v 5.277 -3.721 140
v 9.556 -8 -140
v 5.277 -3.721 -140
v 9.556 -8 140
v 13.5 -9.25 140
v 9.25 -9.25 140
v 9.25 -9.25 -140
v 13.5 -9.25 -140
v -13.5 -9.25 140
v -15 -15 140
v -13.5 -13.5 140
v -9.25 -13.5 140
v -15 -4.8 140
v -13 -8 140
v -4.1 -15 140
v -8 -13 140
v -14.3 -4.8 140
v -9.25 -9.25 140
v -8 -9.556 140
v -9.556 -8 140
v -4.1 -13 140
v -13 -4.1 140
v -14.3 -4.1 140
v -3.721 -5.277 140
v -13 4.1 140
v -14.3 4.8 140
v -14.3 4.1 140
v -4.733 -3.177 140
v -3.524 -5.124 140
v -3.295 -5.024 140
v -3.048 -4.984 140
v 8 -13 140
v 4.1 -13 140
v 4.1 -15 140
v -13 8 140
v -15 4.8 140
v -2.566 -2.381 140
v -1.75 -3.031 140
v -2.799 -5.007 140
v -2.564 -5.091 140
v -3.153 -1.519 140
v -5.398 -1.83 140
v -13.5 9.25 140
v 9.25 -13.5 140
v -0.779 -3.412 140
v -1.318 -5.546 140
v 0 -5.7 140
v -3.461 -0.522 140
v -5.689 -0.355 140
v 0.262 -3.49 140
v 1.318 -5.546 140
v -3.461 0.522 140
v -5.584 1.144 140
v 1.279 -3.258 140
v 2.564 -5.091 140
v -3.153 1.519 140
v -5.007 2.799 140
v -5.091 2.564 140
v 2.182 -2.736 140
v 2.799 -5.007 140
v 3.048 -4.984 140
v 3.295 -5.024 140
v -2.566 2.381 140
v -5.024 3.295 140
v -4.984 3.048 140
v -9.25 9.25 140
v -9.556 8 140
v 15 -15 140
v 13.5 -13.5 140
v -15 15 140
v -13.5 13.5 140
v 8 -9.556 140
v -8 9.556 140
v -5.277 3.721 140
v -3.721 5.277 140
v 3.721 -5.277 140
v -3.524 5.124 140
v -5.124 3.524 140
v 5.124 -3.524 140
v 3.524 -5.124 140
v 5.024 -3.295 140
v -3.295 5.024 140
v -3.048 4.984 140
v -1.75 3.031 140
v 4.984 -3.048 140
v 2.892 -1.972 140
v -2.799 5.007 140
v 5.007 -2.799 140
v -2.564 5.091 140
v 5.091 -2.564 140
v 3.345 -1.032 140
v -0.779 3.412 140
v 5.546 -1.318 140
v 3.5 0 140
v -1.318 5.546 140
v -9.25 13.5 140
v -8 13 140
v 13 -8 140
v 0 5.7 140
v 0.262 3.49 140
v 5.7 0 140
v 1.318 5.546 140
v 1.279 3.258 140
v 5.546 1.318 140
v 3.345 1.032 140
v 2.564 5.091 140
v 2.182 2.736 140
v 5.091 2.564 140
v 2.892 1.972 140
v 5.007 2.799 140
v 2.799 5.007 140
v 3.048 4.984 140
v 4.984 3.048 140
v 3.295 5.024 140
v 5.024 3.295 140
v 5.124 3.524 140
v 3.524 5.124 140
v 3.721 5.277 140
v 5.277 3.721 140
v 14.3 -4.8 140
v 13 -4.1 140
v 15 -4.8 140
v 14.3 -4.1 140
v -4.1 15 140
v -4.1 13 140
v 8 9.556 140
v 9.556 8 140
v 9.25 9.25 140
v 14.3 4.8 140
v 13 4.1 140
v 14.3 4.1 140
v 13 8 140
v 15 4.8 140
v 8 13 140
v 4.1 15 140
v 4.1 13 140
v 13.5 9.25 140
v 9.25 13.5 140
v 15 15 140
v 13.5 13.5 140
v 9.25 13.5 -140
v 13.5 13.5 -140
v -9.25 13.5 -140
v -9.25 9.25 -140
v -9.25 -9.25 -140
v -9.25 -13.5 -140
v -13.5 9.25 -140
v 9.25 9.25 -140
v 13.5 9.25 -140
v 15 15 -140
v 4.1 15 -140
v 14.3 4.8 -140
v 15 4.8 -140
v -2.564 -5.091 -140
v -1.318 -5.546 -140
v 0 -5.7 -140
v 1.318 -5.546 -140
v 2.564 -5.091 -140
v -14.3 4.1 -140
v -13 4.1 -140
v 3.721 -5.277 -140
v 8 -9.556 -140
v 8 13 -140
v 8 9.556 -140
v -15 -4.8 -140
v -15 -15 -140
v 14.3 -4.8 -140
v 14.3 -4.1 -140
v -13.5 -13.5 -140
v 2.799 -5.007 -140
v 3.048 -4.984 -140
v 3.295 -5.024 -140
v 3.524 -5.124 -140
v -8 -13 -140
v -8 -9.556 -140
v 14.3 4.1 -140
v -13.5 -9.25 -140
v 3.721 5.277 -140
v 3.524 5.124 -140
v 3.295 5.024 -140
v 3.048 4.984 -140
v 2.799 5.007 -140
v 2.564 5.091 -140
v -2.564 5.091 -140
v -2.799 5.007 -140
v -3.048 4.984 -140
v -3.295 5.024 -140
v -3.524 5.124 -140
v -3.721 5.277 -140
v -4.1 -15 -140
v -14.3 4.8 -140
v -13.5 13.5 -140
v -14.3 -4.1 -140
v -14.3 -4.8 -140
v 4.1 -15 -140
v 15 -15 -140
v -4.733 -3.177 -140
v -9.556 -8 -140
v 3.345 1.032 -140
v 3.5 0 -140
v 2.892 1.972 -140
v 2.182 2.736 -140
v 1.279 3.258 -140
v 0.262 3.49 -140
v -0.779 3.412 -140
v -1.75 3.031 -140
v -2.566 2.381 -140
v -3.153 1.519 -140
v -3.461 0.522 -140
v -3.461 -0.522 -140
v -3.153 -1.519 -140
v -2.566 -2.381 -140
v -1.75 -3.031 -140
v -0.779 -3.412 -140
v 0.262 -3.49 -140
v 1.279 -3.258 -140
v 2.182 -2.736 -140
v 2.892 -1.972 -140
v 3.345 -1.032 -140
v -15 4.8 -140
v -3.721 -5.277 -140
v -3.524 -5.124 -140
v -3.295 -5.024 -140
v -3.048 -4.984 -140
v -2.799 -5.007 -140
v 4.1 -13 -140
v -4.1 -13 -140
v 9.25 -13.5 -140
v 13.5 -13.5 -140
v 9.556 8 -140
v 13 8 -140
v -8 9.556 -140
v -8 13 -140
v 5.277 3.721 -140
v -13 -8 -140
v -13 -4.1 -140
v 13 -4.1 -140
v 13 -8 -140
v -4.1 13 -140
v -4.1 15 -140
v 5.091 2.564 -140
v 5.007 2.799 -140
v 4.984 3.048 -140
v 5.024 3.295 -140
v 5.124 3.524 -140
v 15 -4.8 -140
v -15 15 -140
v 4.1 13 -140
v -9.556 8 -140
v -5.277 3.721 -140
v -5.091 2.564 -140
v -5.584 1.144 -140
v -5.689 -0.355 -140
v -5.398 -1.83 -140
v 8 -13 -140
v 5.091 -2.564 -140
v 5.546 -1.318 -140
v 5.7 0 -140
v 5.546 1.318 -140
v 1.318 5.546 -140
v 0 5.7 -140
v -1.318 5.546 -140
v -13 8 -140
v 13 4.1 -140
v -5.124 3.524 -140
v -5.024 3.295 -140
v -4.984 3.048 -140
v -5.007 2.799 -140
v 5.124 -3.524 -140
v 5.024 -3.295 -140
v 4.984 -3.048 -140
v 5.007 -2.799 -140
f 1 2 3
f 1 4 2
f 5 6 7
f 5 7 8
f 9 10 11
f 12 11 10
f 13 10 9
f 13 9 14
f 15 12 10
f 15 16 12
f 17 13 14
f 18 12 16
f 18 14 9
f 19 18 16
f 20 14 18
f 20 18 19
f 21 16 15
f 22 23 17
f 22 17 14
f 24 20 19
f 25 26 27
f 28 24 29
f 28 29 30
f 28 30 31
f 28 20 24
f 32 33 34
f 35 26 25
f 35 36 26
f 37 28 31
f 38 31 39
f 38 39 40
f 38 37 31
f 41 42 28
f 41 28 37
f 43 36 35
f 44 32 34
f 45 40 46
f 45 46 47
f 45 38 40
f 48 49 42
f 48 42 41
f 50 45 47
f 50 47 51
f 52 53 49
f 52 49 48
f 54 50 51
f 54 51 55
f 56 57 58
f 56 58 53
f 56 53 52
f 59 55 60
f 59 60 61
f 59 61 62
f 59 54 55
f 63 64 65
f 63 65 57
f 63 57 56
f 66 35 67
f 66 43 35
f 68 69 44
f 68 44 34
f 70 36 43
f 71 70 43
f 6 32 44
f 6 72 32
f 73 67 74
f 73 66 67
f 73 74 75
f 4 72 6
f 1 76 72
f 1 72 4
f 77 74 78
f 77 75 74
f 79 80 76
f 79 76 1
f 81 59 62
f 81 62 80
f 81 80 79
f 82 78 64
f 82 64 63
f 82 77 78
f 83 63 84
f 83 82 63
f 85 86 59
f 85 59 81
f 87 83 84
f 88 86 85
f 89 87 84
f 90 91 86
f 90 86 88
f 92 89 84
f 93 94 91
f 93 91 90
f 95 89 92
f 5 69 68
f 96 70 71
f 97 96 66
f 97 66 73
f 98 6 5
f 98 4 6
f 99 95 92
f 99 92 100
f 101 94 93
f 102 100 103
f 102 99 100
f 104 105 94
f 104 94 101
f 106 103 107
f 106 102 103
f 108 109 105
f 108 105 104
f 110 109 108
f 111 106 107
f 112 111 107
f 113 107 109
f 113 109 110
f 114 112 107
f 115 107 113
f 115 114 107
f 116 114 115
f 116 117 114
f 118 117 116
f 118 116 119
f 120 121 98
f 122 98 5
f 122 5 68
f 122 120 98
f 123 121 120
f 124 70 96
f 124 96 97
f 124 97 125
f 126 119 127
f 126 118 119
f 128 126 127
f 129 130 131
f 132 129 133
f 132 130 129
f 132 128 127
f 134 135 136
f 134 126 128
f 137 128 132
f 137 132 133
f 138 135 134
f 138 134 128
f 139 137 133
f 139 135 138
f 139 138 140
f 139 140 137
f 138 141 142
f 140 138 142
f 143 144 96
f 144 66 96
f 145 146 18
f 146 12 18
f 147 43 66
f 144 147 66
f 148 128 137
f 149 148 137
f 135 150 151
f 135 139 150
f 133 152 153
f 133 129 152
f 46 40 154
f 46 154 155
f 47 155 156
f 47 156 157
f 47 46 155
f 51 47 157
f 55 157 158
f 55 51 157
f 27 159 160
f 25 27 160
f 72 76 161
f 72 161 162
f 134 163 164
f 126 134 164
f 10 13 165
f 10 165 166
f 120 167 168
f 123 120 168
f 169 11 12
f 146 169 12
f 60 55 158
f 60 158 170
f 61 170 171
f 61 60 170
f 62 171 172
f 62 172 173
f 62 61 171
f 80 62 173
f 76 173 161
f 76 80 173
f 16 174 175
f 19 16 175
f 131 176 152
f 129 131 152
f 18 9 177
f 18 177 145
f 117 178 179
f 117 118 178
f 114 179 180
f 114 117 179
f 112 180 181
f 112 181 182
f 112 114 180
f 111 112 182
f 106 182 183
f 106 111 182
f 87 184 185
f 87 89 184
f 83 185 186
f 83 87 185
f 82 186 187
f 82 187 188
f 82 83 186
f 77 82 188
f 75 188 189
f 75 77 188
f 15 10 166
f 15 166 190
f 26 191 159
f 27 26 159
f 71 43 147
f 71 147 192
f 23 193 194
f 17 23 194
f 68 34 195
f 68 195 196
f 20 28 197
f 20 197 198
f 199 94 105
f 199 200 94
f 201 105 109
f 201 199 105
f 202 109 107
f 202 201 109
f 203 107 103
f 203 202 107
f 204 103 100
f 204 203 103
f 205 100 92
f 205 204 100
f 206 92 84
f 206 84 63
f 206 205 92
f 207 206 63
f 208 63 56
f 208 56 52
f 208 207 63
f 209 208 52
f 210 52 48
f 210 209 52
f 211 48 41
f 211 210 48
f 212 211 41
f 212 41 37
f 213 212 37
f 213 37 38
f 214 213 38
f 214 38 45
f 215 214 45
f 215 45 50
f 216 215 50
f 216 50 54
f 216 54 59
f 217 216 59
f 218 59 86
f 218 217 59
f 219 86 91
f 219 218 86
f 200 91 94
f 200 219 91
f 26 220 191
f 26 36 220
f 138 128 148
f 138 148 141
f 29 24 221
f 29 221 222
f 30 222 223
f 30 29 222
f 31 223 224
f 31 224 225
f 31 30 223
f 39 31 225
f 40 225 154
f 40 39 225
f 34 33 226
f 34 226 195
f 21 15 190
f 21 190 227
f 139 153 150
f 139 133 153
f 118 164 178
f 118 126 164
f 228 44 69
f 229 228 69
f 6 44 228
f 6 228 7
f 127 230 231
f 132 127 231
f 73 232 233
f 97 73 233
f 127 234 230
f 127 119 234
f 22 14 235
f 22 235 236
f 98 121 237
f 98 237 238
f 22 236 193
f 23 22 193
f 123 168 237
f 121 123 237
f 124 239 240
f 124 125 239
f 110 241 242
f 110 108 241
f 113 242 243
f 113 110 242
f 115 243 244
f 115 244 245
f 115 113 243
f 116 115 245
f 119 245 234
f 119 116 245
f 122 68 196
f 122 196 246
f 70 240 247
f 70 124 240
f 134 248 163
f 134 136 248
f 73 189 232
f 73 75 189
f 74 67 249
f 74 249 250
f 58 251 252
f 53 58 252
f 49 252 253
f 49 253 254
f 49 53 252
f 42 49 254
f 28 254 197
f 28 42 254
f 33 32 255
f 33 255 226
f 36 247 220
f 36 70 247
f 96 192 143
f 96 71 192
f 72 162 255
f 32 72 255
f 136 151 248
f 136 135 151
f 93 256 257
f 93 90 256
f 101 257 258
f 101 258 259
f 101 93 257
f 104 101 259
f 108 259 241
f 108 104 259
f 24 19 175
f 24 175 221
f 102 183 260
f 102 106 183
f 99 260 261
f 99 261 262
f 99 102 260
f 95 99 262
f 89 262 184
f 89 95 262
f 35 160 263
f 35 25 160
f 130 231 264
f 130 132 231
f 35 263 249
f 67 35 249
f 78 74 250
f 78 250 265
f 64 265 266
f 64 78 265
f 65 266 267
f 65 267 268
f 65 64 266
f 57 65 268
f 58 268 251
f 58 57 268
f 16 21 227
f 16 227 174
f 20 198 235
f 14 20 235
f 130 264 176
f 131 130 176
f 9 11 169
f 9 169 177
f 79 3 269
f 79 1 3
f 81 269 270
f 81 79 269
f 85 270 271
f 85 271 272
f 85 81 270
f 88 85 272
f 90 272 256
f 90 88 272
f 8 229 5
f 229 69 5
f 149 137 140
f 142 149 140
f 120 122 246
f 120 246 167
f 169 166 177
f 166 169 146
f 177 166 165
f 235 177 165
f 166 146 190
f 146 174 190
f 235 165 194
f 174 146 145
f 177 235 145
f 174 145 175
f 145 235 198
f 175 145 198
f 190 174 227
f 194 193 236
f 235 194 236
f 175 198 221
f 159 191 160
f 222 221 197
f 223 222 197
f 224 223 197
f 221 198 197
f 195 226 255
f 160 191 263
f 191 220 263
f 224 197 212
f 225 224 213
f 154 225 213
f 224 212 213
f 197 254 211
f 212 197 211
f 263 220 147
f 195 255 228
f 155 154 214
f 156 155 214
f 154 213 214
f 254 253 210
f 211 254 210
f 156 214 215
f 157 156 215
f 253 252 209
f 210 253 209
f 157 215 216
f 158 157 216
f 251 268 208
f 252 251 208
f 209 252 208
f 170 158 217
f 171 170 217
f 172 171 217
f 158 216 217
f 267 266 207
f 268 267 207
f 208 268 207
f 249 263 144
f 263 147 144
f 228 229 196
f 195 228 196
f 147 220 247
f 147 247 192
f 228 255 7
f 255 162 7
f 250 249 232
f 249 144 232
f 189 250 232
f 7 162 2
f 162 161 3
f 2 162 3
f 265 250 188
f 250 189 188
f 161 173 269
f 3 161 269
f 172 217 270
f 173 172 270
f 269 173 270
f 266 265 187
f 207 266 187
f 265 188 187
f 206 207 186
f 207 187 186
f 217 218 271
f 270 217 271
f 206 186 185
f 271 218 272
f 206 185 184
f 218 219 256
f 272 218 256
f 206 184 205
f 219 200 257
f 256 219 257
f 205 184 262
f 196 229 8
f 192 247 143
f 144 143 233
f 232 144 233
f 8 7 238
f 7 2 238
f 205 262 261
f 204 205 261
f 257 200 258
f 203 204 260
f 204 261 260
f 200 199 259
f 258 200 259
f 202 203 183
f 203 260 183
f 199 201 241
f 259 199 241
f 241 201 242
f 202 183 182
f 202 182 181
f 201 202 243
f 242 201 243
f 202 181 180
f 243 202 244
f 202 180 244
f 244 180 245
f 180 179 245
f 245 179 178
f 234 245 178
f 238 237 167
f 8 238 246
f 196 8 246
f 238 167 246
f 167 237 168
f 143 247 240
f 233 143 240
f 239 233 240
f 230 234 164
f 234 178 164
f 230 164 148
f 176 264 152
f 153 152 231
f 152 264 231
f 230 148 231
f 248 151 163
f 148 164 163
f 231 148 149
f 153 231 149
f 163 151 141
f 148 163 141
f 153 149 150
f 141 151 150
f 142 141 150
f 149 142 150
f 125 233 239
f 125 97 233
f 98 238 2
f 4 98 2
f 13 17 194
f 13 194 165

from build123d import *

# Parameters (mm, degrees)
SKETCH1_R           = 3.5
SKETCH1_W           = 4.25
SKETCH1_H           = 4.25
BOSS_EXTRUDE1_DEPTH = 140


with BuildPart() as part:
    # Sketch1 → Boss-Extrude1 (new, symmetric)
    with BuildSketch(Plane.XY):
        with BuildLine():
            Line((-13, 8), (-9.555634919, 8))
            Line((-9.555634919, 8), (-5.276706211, 3.721071292))
            ThreePointArc((-5.276706211, 3.721071292), (-4.996490762, 3.172693256), (-5.090706575, 2.564119062))
            ThreePointArc((-5.090706575, 2.564119062), (-5.688941006, -0.354894676), (-4.732561446, -3.176926527))
            Line((-4.732561446, -3.176926527), (-9.555634919, -8))
            Line((-9.555634919, -8), (-13, -8))
            Line((-13, -8), (-13, -4.1))
            Line((-13, -4.1), (-14.3, -4.1))
            Line((-14.3, -4.1), (-14.3, -4.8))
            Line((-14.3, -4.8), (-15, -4.8))
            Line((-15, -4.8), (-15, -15))
            Line((-15, -15), (-4.1, -15))
            Line((-4.1, -15), (-4.1, -13))
            Line((-4.1, -13), (-8, -13))
            Line((-8, -13), (-8, -9.555634919))
            Line((-8, -9.555634919), (-3.721071292, -5.276706211))
            ThreePointArc((-3.721071292, -5.276706211), (-3.172693256, -4.996490762), (-2.564119062, -5.090706575))
            ThreePointArc((-2.564119062, -5.090706575), (0, -5.7), (2.564119062, -5.090706575))
            ThreePointArc((2.564119062, -5.090706575), (3.172693256, -4.996490762), (3.721071292, -5.276706211))
            Line((3.721071292, -5.276706211), (8, -9.555634919))
            Line((8, -9.555634919), (8, -13))
            Line((8, -13), (4.1, -13))
            Line((4.1, -13), (4.1, -15))
            Line((4.1, -15), (15, -15))
            Line((15, -15), (15, -4.8))
            Line((15, -4.8), (14.3, -4.8))
            Line((14.3, -4.8), (14.3, -4.1))
            Line((14.3, -4.1), (13, -4.1))
            Line((13, -4.1), (13, -8))
            Line((13, -8), (9.555634919, -8))
            Line((9.555634919, -8), (5.276706211, -3.721071292))
            ThreePointArc((5.276706211, -3.721071292), (4.996490762, -3.172693256), (5.090706575, -2.564119062))
            ThreePointArc((5.090706575, -2.564119062), (5.7, 0), (5.090706575, 2.564119062))
            ThreePointArc((5.090706575, 2.564119062), (4.996490762, 3.172693256), (5.276706211, 3.721071292))
            Line((5.276706211, 3.721071292), (9.555634919, 8))
            Line((9.555634919, 8), (13, 8))
            Line((13, 8), (13, 4.1))
            Line((13, 4.1), (14.3, 4.1))
            Line((14.3, 4.1), (14.3, 4.8))
            Line((14.3, 4.8), (15, 4.8))
            Line((15, 4.8), (15, 15))
            Line((15, 15), (4.1, 15))
            Line((4.1, 15), (4.1, 13))
            Line((4.1, 13), (8, 13))
            Line((8, 13), (8, 9.555634919))
            Line((8, 9.555634919), (3.721071292, 5.276706211))
            ThreePointArc((3.721071292, 5.276706211), (3.172693256, 4.996490762), (2.564119062, 5.090706575))
            ThreePointArc((2.564119062, 5.090706575), (0, 5.7), (-2.564119062, 5.090706575))
            ThreePointArc((-2.564119062, 5.090706575), (-3.172693256, 4.996490762), (-3.721071292, 5.276706211))
            Line((-3.721071292, 5.276706211), (-8, 9.555634919))
            Line((-8, 9.555634919), (-8, 13))
            Line((-8, 13), (-4.1, 13))
            Line((-4.1, 13), (-4.1, 15))
            Line((-4.1, 15), (-15, 15))
            Line((-15, 15), (-15, 4.8))
            Line((-15, 4.8), (-14.3, 4.8))
            Line((-14.3, 4.8), (-14.3, 4.1))
            Line((-14.3, 4.1), (-13, 4.1))
            Line((-13, 4.1), (-13, 8))
        make_face()
        Circle(SKETCH1_R, mode=Mode.SUBTRACT)
        with Locations((11.375, 11.375)):
            Rectangle(SKETCH1_W, SKETCH1_H, mode=Mode.SUBTRACT)
        with Locations((-11.375, -11.375)):
            Rectangle(SKETCH1_W, SKETCH1_H, mode=Mode.SUBTRACT)
        with Locations((11.375, -11.375)):
            Rectangle(SKETCH1_W, SKETCH1_H, mode=Mode.SUBTRACT)
        with Locations((-11.375, 11.375)):
            Rectangle(SKETCH1_W, SKETCH1_H, mode=Mode.SUBTRACT)
    extrude(amount=BOSS_EXTRUDE1_DEPTH, both=True)


solid = part.part
